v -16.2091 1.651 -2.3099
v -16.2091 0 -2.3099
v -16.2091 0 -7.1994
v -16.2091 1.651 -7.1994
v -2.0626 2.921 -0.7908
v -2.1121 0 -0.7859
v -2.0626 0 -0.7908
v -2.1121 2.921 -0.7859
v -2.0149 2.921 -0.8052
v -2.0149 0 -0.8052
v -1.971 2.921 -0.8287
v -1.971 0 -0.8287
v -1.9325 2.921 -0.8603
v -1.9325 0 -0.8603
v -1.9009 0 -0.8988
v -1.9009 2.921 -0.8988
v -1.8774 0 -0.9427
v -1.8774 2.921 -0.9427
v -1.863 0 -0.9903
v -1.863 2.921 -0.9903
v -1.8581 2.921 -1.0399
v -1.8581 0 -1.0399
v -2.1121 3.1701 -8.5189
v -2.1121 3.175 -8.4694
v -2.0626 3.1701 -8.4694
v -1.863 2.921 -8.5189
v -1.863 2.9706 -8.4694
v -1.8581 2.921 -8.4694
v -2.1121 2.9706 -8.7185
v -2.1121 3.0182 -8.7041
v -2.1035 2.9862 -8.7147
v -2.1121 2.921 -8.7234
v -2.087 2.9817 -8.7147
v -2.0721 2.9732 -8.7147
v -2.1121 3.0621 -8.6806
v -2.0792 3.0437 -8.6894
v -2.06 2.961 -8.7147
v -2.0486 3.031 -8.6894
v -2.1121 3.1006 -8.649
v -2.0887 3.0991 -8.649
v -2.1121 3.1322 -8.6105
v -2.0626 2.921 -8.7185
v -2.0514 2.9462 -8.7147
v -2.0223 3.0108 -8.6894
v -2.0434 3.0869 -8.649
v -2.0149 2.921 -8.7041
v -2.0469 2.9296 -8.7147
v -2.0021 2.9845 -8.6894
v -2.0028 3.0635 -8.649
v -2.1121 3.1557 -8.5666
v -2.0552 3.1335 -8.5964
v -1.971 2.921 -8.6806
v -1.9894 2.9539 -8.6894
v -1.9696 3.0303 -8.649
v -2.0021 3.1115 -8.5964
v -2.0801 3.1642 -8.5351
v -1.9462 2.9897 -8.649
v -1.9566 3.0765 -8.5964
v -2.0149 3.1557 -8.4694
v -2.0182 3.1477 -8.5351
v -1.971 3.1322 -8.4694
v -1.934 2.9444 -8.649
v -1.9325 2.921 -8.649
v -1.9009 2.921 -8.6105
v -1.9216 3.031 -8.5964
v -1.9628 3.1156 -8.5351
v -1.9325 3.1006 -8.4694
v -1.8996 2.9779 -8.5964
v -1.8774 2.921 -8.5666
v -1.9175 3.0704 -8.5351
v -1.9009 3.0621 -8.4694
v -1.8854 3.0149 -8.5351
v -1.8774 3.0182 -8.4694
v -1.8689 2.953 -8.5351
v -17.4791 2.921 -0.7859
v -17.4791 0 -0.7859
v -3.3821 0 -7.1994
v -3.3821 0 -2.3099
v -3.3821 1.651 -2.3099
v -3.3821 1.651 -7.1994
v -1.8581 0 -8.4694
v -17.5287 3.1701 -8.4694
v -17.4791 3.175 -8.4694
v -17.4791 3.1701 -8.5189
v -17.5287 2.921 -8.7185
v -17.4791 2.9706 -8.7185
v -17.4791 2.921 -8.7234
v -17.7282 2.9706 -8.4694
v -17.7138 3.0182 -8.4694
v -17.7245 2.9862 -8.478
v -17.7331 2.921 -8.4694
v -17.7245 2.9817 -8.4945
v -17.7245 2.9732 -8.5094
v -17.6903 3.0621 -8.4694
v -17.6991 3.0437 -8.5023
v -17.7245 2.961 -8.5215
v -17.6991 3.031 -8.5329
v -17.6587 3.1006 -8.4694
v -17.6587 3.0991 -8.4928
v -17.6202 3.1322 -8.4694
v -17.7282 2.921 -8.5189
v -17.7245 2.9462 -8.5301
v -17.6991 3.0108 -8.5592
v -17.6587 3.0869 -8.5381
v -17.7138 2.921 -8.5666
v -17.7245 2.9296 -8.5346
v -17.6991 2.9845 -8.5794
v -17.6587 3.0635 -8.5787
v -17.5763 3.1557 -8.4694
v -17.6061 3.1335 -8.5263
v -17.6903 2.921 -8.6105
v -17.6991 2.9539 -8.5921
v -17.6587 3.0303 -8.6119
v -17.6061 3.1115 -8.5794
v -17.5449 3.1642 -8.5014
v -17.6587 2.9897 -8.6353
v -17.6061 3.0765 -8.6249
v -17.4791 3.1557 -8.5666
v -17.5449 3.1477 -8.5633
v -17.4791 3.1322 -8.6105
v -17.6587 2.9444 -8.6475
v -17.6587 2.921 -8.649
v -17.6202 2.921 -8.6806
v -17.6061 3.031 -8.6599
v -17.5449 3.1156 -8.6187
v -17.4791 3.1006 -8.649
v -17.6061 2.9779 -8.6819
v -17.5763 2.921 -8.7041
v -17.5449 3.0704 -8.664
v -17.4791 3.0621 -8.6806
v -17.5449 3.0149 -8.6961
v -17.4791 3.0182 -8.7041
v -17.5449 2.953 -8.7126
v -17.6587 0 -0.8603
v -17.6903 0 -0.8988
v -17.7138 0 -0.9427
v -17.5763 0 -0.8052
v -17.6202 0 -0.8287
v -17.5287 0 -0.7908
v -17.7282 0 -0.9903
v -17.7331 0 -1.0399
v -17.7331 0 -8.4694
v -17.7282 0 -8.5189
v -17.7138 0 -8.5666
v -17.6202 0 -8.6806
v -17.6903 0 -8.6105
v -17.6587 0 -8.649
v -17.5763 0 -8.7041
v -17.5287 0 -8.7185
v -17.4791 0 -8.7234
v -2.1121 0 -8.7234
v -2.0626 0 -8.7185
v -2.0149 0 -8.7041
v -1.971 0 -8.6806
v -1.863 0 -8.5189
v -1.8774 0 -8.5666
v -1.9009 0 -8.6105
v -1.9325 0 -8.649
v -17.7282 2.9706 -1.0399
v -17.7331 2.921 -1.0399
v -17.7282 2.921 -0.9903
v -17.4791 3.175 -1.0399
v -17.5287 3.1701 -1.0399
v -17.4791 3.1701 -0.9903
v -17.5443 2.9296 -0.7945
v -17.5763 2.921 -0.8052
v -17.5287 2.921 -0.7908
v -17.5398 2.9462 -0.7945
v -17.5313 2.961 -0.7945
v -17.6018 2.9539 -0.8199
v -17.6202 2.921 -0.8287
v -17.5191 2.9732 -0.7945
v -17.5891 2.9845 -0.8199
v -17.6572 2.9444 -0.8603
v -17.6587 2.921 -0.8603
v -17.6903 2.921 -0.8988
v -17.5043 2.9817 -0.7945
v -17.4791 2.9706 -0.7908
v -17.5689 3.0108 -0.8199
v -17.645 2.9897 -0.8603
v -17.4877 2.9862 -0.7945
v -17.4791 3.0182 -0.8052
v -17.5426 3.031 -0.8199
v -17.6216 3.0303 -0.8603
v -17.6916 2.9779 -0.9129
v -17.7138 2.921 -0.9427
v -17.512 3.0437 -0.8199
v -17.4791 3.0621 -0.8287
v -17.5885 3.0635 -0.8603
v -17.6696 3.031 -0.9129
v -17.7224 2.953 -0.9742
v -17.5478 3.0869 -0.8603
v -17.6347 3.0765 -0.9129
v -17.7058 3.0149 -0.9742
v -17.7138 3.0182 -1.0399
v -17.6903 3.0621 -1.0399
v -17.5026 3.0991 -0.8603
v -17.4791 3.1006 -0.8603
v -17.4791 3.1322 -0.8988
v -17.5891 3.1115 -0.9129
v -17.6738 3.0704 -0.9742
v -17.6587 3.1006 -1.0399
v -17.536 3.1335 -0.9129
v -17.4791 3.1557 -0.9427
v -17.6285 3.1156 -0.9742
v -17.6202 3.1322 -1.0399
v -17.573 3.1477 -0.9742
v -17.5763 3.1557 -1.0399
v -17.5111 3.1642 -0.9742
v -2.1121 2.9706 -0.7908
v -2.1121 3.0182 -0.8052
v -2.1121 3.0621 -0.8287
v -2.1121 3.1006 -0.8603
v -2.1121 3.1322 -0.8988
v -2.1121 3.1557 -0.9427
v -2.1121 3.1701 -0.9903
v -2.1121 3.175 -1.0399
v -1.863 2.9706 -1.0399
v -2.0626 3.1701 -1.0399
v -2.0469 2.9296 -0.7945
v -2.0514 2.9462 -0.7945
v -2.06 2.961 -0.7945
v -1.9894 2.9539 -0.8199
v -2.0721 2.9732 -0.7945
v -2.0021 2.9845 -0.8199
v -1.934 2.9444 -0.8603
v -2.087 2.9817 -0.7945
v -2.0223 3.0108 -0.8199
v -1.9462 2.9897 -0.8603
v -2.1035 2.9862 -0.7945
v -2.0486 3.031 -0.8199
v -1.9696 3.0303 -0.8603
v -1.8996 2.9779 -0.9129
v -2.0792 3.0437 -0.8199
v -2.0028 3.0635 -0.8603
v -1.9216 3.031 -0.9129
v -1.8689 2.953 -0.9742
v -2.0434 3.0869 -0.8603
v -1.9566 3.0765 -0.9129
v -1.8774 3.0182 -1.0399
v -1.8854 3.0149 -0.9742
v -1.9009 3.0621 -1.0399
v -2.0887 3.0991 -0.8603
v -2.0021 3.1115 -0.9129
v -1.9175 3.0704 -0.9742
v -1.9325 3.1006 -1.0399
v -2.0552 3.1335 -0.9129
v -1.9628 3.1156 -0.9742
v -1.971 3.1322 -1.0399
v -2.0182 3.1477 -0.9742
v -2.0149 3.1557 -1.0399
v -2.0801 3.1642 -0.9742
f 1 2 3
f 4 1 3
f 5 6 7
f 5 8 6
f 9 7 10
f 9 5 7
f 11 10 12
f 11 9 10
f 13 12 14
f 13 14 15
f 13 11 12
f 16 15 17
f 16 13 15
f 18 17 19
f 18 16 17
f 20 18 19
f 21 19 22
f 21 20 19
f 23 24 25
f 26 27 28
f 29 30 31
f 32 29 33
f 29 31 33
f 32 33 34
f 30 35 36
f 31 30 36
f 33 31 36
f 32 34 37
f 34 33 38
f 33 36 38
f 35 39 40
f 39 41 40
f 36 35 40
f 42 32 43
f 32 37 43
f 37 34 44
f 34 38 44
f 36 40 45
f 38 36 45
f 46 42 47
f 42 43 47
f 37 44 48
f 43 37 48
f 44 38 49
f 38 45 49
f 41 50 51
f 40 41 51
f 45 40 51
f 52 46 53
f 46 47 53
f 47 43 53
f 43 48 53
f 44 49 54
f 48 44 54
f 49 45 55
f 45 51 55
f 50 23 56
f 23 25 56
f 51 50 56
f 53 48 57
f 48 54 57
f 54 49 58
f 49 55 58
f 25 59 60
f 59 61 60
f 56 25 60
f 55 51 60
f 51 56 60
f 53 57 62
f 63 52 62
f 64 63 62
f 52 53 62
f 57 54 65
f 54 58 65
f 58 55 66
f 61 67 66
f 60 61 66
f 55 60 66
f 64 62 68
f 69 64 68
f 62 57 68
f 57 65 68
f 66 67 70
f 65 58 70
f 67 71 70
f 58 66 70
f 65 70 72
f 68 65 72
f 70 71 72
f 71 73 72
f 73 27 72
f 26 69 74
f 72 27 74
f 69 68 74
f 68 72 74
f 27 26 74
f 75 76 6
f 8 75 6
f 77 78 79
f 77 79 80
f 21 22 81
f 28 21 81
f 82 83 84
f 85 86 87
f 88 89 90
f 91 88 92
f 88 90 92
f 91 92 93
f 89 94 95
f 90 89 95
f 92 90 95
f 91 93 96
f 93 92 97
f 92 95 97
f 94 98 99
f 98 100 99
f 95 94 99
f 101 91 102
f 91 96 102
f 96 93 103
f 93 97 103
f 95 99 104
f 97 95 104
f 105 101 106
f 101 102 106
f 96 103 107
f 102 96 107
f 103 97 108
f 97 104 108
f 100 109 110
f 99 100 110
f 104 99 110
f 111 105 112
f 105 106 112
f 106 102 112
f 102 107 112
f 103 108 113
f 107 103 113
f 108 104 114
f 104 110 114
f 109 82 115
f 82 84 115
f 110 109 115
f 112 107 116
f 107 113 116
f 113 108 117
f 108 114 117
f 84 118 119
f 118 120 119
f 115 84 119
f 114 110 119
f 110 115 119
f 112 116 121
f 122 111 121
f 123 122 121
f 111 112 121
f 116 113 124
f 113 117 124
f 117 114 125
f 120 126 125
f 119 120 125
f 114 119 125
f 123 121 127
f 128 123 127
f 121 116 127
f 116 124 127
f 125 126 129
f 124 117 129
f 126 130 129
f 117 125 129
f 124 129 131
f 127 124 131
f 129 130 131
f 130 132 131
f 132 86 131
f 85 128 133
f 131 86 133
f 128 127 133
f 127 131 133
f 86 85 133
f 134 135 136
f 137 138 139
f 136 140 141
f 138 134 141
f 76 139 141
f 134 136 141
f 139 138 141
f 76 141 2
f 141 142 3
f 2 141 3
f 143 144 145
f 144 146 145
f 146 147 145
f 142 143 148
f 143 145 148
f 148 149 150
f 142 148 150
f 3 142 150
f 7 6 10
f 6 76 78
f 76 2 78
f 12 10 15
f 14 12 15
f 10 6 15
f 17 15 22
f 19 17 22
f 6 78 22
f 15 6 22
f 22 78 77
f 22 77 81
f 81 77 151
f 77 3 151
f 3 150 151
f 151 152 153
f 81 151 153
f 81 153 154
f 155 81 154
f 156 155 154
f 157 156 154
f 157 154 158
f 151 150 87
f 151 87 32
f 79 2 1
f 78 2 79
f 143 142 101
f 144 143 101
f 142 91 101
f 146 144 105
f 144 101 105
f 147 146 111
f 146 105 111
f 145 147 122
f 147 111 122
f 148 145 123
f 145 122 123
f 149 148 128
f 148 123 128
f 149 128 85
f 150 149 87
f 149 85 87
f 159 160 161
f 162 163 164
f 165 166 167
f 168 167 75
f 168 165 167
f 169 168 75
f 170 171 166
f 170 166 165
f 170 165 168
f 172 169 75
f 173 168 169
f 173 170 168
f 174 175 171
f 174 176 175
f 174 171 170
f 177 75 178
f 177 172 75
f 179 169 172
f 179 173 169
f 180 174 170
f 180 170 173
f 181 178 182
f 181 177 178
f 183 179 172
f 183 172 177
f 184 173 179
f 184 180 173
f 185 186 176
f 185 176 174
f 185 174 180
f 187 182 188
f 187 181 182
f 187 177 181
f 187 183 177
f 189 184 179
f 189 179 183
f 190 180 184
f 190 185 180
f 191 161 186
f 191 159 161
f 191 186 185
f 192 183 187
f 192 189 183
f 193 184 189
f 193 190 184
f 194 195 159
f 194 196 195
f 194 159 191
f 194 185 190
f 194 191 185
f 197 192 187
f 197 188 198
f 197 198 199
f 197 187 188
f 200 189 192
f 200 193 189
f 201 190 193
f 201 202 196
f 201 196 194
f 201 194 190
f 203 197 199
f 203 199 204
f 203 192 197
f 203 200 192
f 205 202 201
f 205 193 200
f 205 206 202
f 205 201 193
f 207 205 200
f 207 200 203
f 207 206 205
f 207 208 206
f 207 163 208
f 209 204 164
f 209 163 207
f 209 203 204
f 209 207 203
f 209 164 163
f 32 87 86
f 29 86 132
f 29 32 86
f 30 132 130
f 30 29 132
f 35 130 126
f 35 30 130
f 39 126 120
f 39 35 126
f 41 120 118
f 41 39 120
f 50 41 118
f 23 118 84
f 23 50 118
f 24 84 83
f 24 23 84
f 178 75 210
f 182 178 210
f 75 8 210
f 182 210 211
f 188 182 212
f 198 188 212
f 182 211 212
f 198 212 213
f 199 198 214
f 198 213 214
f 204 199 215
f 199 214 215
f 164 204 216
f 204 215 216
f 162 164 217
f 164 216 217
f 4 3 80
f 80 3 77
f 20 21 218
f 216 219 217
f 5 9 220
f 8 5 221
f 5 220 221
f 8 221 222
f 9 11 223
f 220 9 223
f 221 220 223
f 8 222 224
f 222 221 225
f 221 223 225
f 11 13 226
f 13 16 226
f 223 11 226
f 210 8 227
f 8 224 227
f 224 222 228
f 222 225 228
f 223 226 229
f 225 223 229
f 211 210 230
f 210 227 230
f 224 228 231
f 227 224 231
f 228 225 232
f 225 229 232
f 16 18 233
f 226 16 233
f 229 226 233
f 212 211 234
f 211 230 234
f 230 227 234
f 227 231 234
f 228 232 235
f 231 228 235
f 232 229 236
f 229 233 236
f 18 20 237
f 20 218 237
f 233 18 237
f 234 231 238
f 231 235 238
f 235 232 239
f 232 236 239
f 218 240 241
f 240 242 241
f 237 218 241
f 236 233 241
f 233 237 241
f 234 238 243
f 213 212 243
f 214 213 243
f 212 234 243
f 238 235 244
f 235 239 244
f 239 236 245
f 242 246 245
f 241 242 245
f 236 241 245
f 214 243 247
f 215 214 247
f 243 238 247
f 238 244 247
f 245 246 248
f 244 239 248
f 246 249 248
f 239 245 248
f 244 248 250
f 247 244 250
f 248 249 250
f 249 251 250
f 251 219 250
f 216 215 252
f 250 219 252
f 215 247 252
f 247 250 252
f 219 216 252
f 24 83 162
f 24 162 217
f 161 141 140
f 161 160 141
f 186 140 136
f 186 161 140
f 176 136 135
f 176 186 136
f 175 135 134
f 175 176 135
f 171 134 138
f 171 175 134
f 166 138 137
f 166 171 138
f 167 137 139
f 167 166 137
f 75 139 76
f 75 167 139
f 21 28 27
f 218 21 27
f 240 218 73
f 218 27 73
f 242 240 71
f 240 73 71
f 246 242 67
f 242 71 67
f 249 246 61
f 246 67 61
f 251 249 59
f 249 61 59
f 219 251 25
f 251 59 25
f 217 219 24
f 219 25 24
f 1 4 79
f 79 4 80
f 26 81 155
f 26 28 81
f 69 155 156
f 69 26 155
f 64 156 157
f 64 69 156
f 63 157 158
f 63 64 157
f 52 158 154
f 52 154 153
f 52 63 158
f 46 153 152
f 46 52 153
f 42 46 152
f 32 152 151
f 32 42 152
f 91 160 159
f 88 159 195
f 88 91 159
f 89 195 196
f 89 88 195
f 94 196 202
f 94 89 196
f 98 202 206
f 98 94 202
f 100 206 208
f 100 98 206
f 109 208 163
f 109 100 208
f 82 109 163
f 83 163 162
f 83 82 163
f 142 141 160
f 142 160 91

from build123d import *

# Parameters (mm, degrees)
SKETCH2_W           = 15.875
SKETCH2_H           = 7.9375
BOSS_EXTRUDE3_DEPTH = 3.175
SHELL1_T            = -1.524
FILLET1_R           = 0.254


with BuildPart() as part:
    # Sketch2 → Boss-Extrude3 (new body)
    with BuildSketch(Plane(origin=(0, 0, 0), x_dir=(1, 0, 0), z_dir=(0, 1, 0))):
        with Locations((-9.795613381, 4.754641089)):
            Rectangle(SKETCH2_W, SKETCH2_H)
    extrude(amount=BOSS_EXTRUDE3_DEPTH)

    # Shell1
    shell1_openings = [part.faces().sort_by_distance(p)[0] for p in [
        (-9.795613381, 0, -4.754641089),
    ]]
    offset(amount=SHELL1_T, openings=shell1_openings, kind=Kind.INTERSECTION)

    # Fillet1
    fillet1_edges = [part.edges().sort_by_distance(p)[0] for p in [
        (-1.858113381, 3.175, -4.754641089),
        (-9.795613381, 3.175, -8.723391089),
        (-17.733113381, 3.175, -4.754641089),
        (-17.733113381, 1.5875, -8.723391089),
        (-1.858113381, 1.5875, -8.723391089),
        (-1.858113381, 1.5875, -0.785891089),
        (-17.733113381, 1.5875, -0.785891089),
        (-9.795613381, 3.175, -0.785891089),
    ]]
    fillet(fillet1_edges, radius=FILLET1_R)


solid = part.part
